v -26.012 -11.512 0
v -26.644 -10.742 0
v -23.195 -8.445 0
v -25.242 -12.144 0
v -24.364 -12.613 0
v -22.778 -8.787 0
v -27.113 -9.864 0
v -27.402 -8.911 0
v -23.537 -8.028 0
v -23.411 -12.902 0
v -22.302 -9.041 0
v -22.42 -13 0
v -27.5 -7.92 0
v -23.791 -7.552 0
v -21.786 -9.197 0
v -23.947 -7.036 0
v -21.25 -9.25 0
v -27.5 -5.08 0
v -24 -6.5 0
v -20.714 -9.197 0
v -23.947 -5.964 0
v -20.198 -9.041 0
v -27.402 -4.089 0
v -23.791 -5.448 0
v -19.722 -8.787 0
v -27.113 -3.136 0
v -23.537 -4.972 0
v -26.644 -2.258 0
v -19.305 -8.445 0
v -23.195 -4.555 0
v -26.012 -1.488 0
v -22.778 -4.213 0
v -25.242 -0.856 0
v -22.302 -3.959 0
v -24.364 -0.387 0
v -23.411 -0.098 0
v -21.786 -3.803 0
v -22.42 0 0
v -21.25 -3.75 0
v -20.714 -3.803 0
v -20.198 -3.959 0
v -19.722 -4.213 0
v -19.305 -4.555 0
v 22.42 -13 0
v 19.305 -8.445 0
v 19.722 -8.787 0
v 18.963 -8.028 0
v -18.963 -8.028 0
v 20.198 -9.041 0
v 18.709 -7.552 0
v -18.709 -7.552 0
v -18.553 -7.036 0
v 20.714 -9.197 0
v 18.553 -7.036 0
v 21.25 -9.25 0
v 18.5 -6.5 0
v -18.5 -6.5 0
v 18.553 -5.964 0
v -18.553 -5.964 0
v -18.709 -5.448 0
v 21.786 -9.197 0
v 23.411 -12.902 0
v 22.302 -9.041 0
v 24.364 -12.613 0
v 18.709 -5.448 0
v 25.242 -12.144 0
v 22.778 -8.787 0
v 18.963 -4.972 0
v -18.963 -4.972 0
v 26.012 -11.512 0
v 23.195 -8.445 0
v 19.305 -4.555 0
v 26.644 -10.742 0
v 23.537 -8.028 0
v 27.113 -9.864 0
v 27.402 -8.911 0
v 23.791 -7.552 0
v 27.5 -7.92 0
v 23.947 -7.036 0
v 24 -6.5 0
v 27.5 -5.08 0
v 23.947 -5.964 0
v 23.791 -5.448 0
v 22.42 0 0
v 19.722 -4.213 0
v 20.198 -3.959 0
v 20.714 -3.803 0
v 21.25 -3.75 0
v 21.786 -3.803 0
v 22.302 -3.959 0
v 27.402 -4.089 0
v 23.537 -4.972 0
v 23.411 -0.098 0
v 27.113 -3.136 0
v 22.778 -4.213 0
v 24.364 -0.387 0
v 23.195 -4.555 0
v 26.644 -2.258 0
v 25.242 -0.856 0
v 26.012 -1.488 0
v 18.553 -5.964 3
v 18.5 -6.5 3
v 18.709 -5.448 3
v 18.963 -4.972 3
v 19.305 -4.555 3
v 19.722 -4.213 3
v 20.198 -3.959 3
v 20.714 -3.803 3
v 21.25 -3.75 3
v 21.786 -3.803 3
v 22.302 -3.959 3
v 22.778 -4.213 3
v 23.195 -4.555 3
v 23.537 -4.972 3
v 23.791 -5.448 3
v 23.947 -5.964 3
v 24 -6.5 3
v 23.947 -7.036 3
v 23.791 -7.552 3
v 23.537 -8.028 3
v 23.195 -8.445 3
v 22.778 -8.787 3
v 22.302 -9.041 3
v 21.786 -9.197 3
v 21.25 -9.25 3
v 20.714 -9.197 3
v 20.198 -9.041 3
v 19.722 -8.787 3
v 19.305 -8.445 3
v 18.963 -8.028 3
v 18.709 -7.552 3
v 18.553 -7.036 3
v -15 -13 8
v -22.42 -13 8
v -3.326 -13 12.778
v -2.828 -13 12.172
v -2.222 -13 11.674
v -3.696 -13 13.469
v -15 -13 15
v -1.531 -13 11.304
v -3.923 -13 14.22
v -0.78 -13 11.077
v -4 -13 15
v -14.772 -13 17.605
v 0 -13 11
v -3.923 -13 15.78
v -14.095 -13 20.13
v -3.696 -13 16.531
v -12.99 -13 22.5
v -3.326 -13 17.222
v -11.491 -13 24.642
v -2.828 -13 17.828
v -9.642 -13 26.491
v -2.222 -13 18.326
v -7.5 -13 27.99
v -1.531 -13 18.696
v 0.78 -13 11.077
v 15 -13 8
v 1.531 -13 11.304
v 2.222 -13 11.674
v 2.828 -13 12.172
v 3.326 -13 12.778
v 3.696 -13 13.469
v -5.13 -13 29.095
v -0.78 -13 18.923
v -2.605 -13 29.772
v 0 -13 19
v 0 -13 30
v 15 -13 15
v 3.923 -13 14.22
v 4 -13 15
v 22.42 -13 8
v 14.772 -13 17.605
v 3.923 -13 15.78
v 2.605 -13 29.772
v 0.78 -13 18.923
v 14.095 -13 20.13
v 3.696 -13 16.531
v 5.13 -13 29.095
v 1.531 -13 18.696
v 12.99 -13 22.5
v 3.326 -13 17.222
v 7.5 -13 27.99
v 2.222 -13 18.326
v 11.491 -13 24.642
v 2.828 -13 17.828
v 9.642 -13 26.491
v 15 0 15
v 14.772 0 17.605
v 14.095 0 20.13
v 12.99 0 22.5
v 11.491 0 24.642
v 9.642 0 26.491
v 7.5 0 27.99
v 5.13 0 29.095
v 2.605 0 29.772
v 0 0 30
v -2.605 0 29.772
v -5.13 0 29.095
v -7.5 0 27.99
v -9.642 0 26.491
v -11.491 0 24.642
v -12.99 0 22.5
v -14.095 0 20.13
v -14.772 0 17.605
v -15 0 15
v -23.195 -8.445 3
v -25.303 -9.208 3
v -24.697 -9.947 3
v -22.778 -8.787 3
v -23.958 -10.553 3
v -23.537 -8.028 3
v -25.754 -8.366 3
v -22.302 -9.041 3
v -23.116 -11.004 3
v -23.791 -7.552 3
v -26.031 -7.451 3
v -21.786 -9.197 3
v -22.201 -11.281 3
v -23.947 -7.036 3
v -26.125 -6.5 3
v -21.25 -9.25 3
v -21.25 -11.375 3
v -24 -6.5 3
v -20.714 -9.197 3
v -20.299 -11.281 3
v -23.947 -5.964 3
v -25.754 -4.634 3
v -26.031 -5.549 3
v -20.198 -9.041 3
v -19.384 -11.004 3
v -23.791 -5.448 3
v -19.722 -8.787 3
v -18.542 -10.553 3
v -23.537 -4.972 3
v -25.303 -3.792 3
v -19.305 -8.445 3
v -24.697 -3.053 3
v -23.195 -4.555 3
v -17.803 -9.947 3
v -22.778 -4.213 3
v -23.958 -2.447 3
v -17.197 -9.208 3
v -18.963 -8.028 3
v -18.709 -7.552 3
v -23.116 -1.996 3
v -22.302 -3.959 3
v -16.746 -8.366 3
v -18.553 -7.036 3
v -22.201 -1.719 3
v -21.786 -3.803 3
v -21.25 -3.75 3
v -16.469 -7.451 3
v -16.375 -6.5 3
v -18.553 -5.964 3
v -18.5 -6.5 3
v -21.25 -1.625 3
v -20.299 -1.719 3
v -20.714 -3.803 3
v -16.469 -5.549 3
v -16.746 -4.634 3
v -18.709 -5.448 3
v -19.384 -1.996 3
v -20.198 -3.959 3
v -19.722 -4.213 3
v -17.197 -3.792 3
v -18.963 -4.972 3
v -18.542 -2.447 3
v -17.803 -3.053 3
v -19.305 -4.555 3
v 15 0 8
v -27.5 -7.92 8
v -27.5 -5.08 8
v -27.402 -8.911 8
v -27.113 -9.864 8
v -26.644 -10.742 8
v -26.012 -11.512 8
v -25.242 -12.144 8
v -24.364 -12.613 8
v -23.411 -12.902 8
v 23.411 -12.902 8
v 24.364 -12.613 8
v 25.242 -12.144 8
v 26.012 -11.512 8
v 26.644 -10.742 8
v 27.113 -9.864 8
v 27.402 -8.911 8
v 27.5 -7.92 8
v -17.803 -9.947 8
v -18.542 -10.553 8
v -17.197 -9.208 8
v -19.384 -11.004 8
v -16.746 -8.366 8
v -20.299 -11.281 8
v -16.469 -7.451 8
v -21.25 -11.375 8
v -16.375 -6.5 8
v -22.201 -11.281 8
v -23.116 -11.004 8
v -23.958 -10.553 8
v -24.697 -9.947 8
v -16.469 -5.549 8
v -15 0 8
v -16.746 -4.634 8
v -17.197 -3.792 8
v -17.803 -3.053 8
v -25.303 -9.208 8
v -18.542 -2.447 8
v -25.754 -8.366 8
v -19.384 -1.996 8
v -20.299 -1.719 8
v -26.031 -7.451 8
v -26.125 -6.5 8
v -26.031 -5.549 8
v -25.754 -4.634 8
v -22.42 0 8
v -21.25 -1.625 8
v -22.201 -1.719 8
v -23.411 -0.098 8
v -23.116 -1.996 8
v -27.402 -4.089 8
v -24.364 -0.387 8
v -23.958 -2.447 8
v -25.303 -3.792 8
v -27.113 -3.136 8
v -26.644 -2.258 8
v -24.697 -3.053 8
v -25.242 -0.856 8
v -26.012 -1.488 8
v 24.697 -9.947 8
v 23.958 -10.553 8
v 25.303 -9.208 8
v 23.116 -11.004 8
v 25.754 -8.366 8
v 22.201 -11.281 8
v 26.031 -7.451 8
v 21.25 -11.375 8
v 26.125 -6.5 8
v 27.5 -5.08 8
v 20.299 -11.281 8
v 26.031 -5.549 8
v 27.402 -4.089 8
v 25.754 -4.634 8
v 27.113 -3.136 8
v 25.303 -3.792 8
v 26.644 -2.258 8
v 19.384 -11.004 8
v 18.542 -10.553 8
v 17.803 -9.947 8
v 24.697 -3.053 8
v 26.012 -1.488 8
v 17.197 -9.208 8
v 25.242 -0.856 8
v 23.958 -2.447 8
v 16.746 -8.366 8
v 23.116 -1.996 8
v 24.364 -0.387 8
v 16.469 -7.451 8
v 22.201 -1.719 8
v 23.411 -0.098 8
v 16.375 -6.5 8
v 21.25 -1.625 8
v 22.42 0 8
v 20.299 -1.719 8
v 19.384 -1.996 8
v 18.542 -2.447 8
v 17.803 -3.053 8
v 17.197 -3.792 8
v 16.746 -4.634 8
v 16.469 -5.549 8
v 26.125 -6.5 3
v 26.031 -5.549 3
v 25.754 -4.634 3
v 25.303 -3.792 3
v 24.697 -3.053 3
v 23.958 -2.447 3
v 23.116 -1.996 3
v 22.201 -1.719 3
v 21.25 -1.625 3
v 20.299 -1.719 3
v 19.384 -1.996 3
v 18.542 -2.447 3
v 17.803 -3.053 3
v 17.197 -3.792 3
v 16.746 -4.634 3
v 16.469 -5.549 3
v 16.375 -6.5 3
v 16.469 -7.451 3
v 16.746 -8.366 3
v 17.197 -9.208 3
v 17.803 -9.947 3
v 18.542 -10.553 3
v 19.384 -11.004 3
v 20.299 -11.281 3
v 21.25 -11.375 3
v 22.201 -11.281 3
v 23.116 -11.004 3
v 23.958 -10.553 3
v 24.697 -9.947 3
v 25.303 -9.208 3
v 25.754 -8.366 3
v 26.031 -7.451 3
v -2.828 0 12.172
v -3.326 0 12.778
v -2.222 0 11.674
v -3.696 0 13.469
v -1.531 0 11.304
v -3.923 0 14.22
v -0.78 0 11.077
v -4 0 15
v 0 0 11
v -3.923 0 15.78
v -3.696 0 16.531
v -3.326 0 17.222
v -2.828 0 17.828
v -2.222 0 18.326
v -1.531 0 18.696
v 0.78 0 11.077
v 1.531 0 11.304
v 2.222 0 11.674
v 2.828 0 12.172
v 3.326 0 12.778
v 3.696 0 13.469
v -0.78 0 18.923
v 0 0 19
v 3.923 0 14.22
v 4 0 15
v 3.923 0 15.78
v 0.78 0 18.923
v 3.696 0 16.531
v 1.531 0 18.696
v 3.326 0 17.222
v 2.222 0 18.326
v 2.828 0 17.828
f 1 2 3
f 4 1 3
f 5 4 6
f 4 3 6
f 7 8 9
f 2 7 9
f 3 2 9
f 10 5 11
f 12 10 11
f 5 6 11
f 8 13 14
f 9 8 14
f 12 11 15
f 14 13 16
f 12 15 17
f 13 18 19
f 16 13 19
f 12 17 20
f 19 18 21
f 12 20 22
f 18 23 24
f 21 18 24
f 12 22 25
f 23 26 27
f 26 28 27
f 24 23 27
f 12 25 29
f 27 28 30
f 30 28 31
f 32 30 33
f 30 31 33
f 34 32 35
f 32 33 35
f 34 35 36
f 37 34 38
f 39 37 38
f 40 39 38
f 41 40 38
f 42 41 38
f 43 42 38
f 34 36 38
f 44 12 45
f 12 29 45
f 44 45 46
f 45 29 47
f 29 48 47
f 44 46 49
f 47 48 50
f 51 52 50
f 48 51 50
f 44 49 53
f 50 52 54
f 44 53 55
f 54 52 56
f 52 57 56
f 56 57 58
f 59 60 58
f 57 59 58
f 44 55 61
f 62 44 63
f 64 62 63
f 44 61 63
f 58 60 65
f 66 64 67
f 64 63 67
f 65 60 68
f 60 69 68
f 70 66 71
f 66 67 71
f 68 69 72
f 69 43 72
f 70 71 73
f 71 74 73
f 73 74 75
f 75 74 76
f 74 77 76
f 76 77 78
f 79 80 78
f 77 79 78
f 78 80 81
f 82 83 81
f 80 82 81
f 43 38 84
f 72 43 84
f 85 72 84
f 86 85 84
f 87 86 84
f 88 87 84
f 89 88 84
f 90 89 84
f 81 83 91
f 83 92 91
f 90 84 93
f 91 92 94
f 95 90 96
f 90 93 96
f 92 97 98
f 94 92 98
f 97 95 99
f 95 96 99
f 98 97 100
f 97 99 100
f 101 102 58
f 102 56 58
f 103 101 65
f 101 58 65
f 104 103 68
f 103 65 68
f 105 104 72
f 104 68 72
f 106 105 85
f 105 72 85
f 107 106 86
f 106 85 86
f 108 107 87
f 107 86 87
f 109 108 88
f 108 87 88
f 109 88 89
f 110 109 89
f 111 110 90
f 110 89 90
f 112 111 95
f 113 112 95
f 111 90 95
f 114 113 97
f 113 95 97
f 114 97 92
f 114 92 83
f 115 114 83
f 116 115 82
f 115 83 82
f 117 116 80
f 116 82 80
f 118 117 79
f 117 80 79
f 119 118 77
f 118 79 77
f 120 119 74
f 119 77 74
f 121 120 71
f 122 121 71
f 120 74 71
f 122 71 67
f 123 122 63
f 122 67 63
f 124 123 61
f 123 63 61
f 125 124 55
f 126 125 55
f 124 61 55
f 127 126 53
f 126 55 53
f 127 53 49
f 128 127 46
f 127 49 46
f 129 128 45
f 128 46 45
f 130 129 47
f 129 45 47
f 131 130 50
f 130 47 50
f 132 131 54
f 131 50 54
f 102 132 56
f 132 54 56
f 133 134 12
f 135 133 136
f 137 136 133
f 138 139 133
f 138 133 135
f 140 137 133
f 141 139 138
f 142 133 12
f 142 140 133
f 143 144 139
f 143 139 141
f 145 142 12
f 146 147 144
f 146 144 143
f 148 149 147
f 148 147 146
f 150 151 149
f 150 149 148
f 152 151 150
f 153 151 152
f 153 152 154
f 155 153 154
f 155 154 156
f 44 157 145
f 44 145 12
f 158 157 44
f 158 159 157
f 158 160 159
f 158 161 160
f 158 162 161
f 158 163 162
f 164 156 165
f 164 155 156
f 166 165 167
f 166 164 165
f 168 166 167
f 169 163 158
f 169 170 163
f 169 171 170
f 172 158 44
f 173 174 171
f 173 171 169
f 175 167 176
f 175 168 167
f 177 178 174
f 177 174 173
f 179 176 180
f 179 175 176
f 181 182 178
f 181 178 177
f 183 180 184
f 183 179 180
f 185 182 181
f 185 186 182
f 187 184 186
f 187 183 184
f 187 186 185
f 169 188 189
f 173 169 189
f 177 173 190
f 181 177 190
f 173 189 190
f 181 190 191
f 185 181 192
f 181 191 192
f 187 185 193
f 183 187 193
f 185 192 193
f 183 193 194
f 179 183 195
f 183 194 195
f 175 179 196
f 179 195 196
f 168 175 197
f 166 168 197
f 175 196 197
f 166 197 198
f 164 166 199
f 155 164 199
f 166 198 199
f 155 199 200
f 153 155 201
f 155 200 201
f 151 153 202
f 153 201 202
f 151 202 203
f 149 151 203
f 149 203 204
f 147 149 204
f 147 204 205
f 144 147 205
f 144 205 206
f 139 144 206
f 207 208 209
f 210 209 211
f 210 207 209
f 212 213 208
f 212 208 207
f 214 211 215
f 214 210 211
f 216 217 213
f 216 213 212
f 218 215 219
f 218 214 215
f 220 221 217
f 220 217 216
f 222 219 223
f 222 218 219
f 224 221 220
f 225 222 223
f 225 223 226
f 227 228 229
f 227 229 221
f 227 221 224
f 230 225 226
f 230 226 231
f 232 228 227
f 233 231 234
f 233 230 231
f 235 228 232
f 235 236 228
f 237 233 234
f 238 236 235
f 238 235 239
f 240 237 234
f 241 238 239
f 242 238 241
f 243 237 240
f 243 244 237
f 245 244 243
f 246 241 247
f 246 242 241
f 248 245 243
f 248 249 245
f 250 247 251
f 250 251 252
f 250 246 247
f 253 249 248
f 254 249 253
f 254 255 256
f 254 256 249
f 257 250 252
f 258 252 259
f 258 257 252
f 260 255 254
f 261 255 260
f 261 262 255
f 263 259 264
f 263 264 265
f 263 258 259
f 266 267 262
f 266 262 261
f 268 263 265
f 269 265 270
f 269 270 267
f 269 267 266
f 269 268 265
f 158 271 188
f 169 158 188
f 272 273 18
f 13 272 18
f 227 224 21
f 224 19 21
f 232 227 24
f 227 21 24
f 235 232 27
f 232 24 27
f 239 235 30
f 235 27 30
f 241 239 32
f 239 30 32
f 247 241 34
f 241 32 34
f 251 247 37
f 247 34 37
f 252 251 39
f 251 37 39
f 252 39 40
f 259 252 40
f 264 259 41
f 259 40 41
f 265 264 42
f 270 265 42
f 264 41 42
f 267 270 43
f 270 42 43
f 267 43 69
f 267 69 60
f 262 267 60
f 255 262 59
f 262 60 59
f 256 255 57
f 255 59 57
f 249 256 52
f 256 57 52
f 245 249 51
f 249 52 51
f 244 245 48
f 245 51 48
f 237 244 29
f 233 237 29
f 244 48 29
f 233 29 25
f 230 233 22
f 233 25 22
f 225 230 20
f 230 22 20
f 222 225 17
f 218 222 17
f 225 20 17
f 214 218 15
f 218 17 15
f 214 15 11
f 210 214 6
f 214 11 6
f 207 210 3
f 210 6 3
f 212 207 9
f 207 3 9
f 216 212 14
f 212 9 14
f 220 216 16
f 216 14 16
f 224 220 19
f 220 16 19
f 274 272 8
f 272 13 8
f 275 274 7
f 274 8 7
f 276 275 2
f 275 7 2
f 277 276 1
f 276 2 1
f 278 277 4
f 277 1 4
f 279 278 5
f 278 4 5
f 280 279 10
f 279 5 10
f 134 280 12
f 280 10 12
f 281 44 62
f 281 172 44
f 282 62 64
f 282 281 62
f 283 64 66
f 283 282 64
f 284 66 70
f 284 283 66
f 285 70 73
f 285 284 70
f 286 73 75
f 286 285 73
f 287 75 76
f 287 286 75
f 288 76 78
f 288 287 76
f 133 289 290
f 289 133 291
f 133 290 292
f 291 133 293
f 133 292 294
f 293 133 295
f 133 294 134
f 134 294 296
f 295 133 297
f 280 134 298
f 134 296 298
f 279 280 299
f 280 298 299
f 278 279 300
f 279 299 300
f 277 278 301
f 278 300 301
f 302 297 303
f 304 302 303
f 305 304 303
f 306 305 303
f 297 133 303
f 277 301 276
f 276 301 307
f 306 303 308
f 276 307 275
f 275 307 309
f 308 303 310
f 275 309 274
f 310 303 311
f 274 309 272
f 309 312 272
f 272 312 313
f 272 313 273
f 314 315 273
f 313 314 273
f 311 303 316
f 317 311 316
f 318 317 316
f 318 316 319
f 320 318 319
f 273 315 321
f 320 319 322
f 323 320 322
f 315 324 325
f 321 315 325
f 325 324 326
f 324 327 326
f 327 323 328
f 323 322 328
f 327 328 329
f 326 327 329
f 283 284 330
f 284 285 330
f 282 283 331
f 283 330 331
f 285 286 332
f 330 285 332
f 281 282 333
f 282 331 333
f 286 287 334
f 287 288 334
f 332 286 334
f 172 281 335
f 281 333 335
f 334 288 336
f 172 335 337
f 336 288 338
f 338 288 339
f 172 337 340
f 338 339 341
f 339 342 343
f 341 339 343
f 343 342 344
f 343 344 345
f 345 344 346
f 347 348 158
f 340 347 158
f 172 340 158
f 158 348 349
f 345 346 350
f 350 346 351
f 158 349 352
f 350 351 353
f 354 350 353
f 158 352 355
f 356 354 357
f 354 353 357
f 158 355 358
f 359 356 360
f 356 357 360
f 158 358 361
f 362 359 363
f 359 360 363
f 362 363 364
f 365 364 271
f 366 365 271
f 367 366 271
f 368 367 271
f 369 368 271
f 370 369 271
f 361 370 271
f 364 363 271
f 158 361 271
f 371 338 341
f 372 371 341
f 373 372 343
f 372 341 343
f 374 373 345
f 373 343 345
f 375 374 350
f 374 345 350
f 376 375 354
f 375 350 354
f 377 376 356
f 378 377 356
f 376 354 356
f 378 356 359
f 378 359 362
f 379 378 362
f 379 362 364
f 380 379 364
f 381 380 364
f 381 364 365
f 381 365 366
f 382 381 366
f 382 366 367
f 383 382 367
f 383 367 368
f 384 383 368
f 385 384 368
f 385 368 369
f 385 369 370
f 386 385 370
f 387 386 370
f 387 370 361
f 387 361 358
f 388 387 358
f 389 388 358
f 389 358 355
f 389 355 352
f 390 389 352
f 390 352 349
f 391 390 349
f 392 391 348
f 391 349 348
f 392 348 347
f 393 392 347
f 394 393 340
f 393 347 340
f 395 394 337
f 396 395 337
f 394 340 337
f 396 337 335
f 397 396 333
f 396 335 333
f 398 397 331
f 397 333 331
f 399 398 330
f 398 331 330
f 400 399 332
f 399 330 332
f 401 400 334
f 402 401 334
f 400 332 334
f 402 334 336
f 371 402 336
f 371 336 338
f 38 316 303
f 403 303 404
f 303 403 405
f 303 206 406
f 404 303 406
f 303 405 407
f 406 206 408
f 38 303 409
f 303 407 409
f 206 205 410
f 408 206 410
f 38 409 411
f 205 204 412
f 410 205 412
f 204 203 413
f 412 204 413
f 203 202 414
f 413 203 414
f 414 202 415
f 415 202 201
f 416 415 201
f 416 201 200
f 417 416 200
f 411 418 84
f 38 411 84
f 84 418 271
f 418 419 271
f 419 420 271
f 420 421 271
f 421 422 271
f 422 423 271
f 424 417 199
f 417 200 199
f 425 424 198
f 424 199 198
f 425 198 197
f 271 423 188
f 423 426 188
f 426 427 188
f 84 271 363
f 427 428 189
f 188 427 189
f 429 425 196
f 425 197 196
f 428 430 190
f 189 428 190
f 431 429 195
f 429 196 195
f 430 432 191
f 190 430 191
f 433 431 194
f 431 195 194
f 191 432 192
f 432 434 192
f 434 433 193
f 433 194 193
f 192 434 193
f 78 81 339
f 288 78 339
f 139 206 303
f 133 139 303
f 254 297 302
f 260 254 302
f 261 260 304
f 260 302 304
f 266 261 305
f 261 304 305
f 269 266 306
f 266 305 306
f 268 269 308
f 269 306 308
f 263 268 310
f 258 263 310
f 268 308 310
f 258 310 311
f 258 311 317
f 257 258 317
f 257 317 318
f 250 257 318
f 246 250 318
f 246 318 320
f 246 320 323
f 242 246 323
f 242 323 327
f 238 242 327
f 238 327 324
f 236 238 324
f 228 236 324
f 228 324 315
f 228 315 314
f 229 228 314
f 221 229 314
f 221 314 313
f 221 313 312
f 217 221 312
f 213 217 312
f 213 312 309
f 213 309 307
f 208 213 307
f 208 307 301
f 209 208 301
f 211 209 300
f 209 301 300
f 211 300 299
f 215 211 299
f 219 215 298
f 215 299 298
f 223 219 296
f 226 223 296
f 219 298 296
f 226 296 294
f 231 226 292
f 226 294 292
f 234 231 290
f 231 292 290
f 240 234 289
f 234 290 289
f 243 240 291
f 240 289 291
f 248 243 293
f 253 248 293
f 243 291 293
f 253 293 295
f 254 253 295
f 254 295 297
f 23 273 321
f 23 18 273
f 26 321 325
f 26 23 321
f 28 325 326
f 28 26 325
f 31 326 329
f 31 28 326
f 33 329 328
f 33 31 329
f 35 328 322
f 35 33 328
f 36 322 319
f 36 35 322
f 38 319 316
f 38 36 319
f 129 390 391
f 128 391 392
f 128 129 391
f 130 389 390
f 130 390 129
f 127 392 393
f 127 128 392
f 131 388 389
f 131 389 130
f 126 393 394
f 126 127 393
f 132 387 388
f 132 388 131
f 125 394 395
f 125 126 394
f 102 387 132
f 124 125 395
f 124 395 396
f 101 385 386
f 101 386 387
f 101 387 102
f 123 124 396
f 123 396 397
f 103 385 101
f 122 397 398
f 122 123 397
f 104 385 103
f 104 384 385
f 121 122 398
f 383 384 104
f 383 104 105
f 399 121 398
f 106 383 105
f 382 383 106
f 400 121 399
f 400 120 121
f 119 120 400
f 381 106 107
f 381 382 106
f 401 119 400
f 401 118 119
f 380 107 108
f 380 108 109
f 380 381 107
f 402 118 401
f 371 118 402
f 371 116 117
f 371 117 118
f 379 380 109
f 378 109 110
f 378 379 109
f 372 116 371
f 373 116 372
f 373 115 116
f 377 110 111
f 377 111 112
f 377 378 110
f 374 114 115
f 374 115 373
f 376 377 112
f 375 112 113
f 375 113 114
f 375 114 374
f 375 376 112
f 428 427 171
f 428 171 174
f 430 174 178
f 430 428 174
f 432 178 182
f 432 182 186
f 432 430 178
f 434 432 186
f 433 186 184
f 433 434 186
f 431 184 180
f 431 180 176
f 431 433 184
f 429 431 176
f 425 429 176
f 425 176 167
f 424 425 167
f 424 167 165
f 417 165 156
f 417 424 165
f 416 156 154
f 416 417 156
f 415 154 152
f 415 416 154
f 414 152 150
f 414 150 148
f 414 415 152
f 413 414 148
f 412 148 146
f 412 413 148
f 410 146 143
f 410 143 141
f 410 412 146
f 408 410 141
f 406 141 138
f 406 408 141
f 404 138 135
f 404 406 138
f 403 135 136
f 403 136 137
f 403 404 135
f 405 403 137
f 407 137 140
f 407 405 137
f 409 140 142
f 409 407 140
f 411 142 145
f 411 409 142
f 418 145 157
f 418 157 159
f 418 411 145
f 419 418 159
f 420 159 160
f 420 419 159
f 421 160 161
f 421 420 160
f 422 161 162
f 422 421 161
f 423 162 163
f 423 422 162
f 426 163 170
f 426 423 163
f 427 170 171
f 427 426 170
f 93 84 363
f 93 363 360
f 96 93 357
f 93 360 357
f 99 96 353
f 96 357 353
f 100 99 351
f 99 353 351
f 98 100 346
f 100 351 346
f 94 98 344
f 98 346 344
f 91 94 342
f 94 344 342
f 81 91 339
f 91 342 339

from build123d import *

# Parameters (mm, degrees)
F0_R           = 4
F1_DEPTH       = 13
F3_D           = 5.5
F3_CBORE_D     = 9.75
F3_CBORE_DEPTH = 5
F4_R           = 5.08


with BuildPart() as f1:
    # F0 (on Front) → F1 (new body)
    with BuildSketch(Plane.XZ):
        with BuildLine():
            Line((-27.5, 8), (-27.5, 0))
            Line((-27.5, 0), (27.5, 0))
            Line((27.5, 0), (27.5, 8))
            Line((27.5, 8), (15, 8))
            Line((15, 8), (15, 15))
            ThreePointArc((15, 15), (0, 30), (-15, 15))
            Line((-15, 15), (-15, 8))
            Line((-15, 8), (-27.5, 8))
        make_face()
        with Locations((0, 15)):
            Circle(F0_R, mode=Mode.SUBTRACT)
    extrude(amount=F1_DEPTH)

    # F3 (through all)
    with Locations(Plane.XY.offset(8)):
        with Locations((-21.25, -6.5), (21.25, -6.5)):
            CounterBoreHole(F3_D / 2, F3_CBORE_D / 2, F3_CBORE_DEPTH)

    # F4
    f4_edges = [f1.edges().sort_by_distance(p)[0] for p in [
        (27.5, -13, 4),
        (27.5, 0, 4),
        (-27.5, -13, 4),
        (-27.5, 0, 4),
    ]]
    fillet(f4_edges, radius=F4_R)


solid = f1.part
